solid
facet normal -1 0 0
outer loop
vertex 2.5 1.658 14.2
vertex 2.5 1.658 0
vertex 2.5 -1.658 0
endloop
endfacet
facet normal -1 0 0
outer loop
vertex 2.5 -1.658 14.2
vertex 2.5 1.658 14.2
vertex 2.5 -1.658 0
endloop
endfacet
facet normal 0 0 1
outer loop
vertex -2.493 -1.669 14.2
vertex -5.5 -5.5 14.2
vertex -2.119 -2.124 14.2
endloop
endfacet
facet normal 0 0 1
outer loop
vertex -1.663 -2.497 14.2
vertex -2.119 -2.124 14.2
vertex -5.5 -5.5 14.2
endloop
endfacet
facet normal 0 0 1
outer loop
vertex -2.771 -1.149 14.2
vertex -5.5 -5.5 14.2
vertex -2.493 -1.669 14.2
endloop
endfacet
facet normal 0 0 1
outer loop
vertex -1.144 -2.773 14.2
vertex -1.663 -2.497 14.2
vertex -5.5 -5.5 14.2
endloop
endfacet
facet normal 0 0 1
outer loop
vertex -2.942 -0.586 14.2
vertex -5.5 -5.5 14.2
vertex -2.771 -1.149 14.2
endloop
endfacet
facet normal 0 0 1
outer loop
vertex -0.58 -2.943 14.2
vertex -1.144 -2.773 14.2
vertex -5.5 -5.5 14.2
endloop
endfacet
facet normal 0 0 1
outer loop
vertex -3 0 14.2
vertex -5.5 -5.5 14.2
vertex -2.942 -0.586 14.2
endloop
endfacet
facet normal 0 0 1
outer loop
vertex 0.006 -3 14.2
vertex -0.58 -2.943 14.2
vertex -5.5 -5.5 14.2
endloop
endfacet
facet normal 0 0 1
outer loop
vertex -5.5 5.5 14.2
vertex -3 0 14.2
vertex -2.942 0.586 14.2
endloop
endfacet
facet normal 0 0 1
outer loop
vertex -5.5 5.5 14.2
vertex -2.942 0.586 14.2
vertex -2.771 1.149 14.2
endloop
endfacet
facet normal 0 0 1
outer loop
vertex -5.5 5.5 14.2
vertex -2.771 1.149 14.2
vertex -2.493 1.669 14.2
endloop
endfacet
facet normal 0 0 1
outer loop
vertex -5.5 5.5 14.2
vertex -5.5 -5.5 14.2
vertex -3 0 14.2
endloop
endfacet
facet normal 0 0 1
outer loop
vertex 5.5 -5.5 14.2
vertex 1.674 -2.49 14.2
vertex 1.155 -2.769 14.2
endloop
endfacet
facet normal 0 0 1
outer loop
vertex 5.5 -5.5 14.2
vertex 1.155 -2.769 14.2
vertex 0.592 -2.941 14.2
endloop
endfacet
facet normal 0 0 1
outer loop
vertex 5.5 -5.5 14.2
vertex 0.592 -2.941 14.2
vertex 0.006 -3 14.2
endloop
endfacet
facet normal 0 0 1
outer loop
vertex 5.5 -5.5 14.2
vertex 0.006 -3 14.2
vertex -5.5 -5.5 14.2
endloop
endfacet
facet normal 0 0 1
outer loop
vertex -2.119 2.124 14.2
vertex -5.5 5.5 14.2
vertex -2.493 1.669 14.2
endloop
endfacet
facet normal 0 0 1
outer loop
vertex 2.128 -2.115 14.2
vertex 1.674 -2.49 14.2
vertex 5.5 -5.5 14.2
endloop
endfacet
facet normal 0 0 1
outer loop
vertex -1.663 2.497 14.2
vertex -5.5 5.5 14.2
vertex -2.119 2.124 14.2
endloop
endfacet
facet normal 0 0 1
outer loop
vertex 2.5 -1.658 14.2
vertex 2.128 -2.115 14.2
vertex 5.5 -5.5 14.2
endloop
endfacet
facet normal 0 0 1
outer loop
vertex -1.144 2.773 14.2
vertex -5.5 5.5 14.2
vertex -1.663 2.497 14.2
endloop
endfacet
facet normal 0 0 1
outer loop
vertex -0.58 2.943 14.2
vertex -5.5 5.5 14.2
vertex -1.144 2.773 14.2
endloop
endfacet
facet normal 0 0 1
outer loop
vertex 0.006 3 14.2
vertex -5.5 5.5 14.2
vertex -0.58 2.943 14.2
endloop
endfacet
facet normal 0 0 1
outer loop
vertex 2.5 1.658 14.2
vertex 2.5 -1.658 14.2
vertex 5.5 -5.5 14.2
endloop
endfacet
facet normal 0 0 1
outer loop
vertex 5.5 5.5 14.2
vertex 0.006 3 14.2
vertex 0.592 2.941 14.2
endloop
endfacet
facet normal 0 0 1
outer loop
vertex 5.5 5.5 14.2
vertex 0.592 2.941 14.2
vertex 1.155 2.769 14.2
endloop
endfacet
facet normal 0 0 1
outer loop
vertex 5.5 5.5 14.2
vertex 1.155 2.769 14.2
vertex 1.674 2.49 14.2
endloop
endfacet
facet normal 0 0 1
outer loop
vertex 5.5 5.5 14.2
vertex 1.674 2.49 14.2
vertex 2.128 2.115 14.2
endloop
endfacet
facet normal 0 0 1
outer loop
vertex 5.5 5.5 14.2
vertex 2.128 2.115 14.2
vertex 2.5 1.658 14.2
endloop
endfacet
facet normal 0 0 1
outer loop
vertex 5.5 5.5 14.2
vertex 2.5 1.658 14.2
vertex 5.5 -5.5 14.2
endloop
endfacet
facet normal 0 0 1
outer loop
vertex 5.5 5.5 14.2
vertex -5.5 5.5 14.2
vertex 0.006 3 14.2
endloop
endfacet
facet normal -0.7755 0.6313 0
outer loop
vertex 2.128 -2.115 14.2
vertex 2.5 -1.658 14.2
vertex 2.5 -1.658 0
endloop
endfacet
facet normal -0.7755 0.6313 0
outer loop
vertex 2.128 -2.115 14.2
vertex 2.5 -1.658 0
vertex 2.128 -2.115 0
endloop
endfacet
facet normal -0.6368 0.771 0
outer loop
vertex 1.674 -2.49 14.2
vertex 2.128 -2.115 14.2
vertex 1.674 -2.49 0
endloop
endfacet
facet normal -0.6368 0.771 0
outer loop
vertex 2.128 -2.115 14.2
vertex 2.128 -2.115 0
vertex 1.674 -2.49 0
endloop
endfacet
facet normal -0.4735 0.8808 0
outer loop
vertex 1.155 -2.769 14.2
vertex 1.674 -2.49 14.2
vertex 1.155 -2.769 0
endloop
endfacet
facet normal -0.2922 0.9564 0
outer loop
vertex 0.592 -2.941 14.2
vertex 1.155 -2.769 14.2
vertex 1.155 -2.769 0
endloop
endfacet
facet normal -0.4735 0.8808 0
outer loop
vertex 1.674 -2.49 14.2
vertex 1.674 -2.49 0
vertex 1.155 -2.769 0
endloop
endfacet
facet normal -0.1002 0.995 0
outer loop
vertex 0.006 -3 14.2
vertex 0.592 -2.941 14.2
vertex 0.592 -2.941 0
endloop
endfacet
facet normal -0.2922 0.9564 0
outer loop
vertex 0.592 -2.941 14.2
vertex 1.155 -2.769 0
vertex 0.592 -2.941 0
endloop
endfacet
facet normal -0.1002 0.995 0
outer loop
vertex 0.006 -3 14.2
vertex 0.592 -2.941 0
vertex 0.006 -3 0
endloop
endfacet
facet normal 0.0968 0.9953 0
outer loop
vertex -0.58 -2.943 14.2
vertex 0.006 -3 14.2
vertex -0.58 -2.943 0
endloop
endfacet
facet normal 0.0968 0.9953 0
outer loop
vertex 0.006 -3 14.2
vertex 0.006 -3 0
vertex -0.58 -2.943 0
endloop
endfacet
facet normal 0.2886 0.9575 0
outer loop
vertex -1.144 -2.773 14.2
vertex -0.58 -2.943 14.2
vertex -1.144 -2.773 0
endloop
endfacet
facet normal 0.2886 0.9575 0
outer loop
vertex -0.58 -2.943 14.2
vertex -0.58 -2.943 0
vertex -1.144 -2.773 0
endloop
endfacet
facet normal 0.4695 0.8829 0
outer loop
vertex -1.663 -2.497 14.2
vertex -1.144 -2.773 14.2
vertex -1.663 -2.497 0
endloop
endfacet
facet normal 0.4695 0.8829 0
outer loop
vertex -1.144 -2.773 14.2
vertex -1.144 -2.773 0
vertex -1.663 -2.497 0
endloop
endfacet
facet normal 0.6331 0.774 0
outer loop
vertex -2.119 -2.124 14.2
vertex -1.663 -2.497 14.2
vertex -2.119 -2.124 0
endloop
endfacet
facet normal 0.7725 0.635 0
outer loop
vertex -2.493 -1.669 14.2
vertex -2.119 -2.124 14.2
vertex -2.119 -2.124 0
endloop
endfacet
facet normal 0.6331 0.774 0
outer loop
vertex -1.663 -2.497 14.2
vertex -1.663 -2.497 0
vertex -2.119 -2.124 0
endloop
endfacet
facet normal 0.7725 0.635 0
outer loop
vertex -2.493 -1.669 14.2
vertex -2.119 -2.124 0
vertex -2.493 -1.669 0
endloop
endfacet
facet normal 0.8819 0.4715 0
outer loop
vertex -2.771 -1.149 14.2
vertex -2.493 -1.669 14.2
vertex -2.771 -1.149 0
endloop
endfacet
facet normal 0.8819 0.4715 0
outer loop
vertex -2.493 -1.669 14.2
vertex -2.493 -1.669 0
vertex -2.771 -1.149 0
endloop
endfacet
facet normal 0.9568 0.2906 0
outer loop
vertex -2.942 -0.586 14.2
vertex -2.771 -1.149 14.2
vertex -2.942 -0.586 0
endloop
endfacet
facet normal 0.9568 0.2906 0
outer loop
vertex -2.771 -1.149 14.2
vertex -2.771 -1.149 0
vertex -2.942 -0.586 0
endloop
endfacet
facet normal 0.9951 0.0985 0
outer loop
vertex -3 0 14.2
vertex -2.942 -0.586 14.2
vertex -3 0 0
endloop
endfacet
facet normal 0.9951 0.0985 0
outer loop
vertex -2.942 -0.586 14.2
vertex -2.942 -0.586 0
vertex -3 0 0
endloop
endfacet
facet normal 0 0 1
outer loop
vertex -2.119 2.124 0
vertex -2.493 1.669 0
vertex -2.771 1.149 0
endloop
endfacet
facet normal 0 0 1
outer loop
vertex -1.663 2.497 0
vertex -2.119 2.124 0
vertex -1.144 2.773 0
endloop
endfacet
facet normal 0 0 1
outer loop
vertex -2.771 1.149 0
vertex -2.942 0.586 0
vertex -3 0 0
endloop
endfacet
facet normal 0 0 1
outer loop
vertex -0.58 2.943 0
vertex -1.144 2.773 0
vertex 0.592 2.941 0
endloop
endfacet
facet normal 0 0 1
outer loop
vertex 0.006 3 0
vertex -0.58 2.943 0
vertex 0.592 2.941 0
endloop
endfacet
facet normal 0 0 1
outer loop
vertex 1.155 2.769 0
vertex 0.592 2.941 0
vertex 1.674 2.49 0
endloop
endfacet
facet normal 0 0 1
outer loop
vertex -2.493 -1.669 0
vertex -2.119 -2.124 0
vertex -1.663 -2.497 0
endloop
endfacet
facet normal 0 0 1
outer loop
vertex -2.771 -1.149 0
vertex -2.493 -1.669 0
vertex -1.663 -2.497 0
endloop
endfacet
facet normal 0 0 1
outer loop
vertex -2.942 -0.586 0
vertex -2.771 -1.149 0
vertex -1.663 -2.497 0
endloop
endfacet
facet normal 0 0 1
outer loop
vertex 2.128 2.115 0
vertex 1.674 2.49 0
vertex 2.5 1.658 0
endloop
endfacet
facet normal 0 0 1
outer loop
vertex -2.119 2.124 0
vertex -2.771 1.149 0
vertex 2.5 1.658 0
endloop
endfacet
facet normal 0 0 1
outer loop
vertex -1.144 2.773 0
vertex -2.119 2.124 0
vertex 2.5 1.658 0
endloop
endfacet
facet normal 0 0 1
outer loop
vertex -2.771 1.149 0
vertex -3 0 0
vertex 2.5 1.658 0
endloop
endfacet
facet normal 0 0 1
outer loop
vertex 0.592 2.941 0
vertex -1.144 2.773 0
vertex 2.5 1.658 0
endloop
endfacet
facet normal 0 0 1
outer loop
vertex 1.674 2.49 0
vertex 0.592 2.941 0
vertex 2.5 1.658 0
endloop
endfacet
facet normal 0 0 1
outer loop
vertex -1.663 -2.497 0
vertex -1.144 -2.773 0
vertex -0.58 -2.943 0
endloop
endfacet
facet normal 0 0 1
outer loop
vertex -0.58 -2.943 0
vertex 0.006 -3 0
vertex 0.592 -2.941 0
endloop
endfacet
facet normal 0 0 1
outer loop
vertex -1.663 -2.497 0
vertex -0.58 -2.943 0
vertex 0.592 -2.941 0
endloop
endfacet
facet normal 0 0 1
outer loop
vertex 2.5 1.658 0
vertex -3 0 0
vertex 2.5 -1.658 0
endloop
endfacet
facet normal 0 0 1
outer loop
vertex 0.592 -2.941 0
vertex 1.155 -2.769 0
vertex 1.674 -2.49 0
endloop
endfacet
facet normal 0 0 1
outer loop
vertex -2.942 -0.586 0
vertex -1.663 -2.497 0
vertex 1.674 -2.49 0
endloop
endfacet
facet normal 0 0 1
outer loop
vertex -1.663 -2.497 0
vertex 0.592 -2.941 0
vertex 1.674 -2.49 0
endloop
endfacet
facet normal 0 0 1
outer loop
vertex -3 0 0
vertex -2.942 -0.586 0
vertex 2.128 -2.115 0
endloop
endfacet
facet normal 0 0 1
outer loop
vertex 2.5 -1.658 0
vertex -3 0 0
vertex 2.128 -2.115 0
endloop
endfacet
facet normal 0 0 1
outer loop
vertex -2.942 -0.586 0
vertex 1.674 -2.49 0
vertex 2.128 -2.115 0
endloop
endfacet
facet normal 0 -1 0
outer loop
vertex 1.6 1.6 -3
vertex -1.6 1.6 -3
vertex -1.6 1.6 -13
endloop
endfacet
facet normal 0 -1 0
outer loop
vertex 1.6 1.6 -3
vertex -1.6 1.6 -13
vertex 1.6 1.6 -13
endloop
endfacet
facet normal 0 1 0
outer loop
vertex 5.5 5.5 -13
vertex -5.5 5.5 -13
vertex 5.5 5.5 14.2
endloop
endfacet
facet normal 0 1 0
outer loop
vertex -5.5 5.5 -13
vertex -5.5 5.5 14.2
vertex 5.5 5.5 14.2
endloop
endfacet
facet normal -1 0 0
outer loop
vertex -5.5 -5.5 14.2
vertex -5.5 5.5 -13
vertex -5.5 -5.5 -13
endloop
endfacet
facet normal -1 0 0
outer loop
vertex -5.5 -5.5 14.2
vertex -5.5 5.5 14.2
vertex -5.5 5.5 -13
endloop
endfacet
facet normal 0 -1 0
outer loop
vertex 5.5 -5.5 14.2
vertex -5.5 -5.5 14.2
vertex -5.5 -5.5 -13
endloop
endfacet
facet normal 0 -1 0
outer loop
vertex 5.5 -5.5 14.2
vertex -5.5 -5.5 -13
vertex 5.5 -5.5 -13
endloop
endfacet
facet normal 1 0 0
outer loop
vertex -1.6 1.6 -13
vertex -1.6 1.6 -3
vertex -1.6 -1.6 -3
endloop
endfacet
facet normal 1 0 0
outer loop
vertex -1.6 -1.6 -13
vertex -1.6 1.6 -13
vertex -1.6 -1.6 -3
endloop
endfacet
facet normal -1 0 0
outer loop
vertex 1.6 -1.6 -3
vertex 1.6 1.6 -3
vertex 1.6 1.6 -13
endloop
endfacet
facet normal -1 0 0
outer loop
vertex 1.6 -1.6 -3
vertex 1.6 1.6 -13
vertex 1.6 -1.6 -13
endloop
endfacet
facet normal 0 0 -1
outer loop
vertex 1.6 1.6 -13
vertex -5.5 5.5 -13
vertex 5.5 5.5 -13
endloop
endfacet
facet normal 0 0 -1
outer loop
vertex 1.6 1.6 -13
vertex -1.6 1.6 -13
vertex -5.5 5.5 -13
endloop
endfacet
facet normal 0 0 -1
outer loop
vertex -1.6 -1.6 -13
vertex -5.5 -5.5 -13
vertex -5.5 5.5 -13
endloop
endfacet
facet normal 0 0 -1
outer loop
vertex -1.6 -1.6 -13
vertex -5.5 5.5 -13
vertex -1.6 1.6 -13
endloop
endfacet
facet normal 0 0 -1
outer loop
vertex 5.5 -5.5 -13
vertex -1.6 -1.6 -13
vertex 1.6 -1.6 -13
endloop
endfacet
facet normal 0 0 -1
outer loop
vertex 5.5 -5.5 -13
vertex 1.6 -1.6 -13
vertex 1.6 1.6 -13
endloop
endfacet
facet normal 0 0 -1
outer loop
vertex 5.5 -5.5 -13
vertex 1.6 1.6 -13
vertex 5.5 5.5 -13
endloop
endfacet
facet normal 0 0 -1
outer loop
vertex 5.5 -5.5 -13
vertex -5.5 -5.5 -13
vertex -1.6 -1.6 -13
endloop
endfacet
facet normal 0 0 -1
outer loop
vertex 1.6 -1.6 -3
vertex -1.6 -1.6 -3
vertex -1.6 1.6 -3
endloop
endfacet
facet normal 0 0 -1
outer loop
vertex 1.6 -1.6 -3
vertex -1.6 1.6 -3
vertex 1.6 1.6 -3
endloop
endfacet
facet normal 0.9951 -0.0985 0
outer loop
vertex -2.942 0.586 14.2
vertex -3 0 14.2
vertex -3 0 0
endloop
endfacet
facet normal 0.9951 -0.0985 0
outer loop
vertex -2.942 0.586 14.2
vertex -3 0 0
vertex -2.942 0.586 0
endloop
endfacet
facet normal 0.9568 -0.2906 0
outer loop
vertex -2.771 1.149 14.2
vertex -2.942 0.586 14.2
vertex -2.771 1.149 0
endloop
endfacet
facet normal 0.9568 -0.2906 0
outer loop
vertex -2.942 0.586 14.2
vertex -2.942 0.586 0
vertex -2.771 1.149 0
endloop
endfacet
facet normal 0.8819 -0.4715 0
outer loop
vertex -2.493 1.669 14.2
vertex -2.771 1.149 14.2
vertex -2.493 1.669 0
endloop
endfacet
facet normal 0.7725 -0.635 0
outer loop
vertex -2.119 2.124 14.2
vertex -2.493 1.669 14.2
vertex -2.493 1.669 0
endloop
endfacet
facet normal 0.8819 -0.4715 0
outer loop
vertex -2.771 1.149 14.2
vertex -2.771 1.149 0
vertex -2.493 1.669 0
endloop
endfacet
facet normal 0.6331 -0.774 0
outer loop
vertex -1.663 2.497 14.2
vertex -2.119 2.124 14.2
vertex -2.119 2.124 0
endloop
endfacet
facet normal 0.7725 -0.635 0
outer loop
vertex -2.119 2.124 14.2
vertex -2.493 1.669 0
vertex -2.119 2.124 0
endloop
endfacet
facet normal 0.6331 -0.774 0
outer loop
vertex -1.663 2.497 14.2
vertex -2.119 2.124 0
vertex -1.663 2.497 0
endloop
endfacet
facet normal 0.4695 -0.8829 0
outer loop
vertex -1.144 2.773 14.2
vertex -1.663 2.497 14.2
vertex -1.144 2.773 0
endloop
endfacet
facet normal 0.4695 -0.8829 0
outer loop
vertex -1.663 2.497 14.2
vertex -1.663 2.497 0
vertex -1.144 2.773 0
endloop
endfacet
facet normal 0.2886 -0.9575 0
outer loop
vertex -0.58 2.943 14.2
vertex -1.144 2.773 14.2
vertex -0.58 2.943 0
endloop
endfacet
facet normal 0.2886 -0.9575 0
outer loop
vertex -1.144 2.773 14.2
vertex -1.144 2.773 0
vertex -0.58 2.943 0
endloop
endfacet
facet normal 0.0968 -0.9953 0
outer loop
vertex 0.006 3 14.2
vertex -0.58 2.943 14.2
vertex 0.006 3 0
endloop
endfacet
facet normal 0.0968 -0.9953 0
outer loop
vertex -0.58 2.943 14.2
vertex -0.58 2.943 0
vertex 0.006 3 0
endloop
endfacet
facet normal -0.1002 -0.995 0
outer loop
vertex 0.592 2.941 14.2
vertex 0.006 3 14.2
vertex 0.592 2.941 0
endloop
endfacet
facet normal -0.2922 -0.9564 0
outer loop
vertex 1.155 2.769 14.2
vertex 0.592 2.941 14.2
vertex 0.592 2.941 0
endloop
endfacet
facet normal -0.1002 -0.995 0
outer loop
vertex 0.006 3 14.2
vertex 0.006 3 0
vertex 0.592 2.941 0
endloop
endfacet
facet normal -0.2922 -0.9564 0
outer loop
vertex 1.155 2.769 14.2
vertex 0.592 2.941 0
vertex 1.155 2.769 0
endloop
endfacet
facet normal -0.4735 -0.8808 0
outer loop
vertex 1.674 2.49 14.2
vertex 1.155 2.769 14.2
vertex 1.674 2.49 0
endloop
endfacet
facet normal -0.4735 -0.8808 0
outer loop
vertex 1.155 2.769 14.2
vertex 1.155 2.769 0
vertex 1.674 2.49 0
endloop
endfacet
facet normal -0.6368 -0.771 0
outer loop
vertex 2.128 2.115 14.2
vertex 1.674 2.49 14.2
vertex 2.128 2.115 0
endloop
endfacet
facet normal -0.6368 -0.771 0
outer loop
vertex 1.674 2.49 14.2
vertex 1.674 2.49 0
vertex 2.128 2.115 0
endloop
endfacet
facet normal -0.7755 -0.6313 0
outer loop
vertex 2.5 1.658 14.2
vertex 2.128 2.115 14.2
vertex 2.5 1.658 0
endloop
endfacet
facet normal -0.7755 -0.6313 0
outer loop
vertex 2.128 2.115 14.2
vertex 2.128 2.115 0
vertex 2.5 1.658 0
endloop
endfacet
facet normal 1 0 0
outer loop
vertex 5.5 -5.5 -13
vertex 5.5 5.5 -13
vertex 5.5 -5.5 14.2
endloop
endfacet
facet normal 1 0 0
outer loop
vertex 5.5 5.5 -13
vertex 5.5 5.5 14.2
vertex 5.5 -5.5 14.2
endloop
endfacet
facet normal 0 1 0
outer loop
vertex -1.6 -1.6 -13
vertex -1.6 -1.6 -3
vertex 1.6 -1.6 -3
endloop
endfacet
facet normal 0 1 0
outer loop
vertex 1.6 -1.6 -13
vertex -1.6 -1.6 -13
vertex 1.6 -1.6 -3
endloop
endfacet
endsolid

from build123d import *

# Parameters (mm, degrees)
F0_W     = 11
F0_H     = 11
F1_DEPTH = 14.2
F2_W     = 11
F2_H     = 11
F3_DEPTH = 3
F4_W     = 11
F4_H     = 11
F4_W_2   = 3.2
F4_H_2   = 3.2
F5_DEPTH = 10


# Not quite as in the source:
# - a feature names something its author has since deleted; it is built from what else it names


with BuildPart() as f1:
    # F0 (on Top) → F1 (new body)
    with BuildSketch(Plane.XY):
        Rectangle(F0_W, F0_H)
        with BuildLine():
            ThreePointArc((2.5, 1.6583123952), (2.8722813233, 0.8660254038), (3, 0))
            ThreePointArc((3, 0), (2.8722813233, -0.8660254038), (2.5, -1.6583123952))
            ThreePointArc((2.5, -1.6583123952), (-0.8660254038, -2.8722813233), (-3, 0))
            ThreePointArc((-3, 0), (-0.8660254038, 2.8722813233), (2.5, 1.6583123952))
        make_face(mode=Mode.SUBTRACT)
        with BuildLine():
            ThreePointArc((2.5, -1.6583123952), (2.8722813233, -0.8660254038), (3, 0))
            ThreePointArc((3, 0), (2.8722813233, 0.8660254038), (2.5, 1.6583123952))
            Line((2.5, 1.6583123952), (2.5, 0))
            Line((2.5, 0), (2.5, -1.6583123952))
        make_face()
    extrude(amount=F1_DEPTH)

    # F2 (on face) → F3 (join)
    with BuildSketch(Plane(origin=(0, 0, 0), x_dir=(1, 0, 0), z_dir=(0, 0, -1))):
        Rectangle(F2_W, F2_H)
        with BuildLine():
            ThreePointArc((2.5, -1.6583123952), (-3, 0), (2.5, 1.6583123952))
            Line((2.5, 1.6583123952), (2.5, -1.6583123952))
        make_face(mode=Mode.SUBTRACT)
        with BuildLine():
            Line((2.5, -1.6583123952), (2.5, 1.6583123952))
            ThreePointArc((2.5, 1.6583123952), (-3, 0), (2.5, -1.6583123952))
        make_face()
    extrude(amount=F3_DEPTH)

    # F4 (on face) → F5 (join)
    with BuildSketch(Plane(origin=(0, 0, -3), x_dir=(1, 0, 0), z_dir=(0, 0, -1))):
        Rectangle(F4_W, F4_H)
        Rectangle(F4_W_2, F4_H_2, mode=Mode.SUBTRACT)
    extrude(amount=F5_DEPTH)


solid = f1.part
